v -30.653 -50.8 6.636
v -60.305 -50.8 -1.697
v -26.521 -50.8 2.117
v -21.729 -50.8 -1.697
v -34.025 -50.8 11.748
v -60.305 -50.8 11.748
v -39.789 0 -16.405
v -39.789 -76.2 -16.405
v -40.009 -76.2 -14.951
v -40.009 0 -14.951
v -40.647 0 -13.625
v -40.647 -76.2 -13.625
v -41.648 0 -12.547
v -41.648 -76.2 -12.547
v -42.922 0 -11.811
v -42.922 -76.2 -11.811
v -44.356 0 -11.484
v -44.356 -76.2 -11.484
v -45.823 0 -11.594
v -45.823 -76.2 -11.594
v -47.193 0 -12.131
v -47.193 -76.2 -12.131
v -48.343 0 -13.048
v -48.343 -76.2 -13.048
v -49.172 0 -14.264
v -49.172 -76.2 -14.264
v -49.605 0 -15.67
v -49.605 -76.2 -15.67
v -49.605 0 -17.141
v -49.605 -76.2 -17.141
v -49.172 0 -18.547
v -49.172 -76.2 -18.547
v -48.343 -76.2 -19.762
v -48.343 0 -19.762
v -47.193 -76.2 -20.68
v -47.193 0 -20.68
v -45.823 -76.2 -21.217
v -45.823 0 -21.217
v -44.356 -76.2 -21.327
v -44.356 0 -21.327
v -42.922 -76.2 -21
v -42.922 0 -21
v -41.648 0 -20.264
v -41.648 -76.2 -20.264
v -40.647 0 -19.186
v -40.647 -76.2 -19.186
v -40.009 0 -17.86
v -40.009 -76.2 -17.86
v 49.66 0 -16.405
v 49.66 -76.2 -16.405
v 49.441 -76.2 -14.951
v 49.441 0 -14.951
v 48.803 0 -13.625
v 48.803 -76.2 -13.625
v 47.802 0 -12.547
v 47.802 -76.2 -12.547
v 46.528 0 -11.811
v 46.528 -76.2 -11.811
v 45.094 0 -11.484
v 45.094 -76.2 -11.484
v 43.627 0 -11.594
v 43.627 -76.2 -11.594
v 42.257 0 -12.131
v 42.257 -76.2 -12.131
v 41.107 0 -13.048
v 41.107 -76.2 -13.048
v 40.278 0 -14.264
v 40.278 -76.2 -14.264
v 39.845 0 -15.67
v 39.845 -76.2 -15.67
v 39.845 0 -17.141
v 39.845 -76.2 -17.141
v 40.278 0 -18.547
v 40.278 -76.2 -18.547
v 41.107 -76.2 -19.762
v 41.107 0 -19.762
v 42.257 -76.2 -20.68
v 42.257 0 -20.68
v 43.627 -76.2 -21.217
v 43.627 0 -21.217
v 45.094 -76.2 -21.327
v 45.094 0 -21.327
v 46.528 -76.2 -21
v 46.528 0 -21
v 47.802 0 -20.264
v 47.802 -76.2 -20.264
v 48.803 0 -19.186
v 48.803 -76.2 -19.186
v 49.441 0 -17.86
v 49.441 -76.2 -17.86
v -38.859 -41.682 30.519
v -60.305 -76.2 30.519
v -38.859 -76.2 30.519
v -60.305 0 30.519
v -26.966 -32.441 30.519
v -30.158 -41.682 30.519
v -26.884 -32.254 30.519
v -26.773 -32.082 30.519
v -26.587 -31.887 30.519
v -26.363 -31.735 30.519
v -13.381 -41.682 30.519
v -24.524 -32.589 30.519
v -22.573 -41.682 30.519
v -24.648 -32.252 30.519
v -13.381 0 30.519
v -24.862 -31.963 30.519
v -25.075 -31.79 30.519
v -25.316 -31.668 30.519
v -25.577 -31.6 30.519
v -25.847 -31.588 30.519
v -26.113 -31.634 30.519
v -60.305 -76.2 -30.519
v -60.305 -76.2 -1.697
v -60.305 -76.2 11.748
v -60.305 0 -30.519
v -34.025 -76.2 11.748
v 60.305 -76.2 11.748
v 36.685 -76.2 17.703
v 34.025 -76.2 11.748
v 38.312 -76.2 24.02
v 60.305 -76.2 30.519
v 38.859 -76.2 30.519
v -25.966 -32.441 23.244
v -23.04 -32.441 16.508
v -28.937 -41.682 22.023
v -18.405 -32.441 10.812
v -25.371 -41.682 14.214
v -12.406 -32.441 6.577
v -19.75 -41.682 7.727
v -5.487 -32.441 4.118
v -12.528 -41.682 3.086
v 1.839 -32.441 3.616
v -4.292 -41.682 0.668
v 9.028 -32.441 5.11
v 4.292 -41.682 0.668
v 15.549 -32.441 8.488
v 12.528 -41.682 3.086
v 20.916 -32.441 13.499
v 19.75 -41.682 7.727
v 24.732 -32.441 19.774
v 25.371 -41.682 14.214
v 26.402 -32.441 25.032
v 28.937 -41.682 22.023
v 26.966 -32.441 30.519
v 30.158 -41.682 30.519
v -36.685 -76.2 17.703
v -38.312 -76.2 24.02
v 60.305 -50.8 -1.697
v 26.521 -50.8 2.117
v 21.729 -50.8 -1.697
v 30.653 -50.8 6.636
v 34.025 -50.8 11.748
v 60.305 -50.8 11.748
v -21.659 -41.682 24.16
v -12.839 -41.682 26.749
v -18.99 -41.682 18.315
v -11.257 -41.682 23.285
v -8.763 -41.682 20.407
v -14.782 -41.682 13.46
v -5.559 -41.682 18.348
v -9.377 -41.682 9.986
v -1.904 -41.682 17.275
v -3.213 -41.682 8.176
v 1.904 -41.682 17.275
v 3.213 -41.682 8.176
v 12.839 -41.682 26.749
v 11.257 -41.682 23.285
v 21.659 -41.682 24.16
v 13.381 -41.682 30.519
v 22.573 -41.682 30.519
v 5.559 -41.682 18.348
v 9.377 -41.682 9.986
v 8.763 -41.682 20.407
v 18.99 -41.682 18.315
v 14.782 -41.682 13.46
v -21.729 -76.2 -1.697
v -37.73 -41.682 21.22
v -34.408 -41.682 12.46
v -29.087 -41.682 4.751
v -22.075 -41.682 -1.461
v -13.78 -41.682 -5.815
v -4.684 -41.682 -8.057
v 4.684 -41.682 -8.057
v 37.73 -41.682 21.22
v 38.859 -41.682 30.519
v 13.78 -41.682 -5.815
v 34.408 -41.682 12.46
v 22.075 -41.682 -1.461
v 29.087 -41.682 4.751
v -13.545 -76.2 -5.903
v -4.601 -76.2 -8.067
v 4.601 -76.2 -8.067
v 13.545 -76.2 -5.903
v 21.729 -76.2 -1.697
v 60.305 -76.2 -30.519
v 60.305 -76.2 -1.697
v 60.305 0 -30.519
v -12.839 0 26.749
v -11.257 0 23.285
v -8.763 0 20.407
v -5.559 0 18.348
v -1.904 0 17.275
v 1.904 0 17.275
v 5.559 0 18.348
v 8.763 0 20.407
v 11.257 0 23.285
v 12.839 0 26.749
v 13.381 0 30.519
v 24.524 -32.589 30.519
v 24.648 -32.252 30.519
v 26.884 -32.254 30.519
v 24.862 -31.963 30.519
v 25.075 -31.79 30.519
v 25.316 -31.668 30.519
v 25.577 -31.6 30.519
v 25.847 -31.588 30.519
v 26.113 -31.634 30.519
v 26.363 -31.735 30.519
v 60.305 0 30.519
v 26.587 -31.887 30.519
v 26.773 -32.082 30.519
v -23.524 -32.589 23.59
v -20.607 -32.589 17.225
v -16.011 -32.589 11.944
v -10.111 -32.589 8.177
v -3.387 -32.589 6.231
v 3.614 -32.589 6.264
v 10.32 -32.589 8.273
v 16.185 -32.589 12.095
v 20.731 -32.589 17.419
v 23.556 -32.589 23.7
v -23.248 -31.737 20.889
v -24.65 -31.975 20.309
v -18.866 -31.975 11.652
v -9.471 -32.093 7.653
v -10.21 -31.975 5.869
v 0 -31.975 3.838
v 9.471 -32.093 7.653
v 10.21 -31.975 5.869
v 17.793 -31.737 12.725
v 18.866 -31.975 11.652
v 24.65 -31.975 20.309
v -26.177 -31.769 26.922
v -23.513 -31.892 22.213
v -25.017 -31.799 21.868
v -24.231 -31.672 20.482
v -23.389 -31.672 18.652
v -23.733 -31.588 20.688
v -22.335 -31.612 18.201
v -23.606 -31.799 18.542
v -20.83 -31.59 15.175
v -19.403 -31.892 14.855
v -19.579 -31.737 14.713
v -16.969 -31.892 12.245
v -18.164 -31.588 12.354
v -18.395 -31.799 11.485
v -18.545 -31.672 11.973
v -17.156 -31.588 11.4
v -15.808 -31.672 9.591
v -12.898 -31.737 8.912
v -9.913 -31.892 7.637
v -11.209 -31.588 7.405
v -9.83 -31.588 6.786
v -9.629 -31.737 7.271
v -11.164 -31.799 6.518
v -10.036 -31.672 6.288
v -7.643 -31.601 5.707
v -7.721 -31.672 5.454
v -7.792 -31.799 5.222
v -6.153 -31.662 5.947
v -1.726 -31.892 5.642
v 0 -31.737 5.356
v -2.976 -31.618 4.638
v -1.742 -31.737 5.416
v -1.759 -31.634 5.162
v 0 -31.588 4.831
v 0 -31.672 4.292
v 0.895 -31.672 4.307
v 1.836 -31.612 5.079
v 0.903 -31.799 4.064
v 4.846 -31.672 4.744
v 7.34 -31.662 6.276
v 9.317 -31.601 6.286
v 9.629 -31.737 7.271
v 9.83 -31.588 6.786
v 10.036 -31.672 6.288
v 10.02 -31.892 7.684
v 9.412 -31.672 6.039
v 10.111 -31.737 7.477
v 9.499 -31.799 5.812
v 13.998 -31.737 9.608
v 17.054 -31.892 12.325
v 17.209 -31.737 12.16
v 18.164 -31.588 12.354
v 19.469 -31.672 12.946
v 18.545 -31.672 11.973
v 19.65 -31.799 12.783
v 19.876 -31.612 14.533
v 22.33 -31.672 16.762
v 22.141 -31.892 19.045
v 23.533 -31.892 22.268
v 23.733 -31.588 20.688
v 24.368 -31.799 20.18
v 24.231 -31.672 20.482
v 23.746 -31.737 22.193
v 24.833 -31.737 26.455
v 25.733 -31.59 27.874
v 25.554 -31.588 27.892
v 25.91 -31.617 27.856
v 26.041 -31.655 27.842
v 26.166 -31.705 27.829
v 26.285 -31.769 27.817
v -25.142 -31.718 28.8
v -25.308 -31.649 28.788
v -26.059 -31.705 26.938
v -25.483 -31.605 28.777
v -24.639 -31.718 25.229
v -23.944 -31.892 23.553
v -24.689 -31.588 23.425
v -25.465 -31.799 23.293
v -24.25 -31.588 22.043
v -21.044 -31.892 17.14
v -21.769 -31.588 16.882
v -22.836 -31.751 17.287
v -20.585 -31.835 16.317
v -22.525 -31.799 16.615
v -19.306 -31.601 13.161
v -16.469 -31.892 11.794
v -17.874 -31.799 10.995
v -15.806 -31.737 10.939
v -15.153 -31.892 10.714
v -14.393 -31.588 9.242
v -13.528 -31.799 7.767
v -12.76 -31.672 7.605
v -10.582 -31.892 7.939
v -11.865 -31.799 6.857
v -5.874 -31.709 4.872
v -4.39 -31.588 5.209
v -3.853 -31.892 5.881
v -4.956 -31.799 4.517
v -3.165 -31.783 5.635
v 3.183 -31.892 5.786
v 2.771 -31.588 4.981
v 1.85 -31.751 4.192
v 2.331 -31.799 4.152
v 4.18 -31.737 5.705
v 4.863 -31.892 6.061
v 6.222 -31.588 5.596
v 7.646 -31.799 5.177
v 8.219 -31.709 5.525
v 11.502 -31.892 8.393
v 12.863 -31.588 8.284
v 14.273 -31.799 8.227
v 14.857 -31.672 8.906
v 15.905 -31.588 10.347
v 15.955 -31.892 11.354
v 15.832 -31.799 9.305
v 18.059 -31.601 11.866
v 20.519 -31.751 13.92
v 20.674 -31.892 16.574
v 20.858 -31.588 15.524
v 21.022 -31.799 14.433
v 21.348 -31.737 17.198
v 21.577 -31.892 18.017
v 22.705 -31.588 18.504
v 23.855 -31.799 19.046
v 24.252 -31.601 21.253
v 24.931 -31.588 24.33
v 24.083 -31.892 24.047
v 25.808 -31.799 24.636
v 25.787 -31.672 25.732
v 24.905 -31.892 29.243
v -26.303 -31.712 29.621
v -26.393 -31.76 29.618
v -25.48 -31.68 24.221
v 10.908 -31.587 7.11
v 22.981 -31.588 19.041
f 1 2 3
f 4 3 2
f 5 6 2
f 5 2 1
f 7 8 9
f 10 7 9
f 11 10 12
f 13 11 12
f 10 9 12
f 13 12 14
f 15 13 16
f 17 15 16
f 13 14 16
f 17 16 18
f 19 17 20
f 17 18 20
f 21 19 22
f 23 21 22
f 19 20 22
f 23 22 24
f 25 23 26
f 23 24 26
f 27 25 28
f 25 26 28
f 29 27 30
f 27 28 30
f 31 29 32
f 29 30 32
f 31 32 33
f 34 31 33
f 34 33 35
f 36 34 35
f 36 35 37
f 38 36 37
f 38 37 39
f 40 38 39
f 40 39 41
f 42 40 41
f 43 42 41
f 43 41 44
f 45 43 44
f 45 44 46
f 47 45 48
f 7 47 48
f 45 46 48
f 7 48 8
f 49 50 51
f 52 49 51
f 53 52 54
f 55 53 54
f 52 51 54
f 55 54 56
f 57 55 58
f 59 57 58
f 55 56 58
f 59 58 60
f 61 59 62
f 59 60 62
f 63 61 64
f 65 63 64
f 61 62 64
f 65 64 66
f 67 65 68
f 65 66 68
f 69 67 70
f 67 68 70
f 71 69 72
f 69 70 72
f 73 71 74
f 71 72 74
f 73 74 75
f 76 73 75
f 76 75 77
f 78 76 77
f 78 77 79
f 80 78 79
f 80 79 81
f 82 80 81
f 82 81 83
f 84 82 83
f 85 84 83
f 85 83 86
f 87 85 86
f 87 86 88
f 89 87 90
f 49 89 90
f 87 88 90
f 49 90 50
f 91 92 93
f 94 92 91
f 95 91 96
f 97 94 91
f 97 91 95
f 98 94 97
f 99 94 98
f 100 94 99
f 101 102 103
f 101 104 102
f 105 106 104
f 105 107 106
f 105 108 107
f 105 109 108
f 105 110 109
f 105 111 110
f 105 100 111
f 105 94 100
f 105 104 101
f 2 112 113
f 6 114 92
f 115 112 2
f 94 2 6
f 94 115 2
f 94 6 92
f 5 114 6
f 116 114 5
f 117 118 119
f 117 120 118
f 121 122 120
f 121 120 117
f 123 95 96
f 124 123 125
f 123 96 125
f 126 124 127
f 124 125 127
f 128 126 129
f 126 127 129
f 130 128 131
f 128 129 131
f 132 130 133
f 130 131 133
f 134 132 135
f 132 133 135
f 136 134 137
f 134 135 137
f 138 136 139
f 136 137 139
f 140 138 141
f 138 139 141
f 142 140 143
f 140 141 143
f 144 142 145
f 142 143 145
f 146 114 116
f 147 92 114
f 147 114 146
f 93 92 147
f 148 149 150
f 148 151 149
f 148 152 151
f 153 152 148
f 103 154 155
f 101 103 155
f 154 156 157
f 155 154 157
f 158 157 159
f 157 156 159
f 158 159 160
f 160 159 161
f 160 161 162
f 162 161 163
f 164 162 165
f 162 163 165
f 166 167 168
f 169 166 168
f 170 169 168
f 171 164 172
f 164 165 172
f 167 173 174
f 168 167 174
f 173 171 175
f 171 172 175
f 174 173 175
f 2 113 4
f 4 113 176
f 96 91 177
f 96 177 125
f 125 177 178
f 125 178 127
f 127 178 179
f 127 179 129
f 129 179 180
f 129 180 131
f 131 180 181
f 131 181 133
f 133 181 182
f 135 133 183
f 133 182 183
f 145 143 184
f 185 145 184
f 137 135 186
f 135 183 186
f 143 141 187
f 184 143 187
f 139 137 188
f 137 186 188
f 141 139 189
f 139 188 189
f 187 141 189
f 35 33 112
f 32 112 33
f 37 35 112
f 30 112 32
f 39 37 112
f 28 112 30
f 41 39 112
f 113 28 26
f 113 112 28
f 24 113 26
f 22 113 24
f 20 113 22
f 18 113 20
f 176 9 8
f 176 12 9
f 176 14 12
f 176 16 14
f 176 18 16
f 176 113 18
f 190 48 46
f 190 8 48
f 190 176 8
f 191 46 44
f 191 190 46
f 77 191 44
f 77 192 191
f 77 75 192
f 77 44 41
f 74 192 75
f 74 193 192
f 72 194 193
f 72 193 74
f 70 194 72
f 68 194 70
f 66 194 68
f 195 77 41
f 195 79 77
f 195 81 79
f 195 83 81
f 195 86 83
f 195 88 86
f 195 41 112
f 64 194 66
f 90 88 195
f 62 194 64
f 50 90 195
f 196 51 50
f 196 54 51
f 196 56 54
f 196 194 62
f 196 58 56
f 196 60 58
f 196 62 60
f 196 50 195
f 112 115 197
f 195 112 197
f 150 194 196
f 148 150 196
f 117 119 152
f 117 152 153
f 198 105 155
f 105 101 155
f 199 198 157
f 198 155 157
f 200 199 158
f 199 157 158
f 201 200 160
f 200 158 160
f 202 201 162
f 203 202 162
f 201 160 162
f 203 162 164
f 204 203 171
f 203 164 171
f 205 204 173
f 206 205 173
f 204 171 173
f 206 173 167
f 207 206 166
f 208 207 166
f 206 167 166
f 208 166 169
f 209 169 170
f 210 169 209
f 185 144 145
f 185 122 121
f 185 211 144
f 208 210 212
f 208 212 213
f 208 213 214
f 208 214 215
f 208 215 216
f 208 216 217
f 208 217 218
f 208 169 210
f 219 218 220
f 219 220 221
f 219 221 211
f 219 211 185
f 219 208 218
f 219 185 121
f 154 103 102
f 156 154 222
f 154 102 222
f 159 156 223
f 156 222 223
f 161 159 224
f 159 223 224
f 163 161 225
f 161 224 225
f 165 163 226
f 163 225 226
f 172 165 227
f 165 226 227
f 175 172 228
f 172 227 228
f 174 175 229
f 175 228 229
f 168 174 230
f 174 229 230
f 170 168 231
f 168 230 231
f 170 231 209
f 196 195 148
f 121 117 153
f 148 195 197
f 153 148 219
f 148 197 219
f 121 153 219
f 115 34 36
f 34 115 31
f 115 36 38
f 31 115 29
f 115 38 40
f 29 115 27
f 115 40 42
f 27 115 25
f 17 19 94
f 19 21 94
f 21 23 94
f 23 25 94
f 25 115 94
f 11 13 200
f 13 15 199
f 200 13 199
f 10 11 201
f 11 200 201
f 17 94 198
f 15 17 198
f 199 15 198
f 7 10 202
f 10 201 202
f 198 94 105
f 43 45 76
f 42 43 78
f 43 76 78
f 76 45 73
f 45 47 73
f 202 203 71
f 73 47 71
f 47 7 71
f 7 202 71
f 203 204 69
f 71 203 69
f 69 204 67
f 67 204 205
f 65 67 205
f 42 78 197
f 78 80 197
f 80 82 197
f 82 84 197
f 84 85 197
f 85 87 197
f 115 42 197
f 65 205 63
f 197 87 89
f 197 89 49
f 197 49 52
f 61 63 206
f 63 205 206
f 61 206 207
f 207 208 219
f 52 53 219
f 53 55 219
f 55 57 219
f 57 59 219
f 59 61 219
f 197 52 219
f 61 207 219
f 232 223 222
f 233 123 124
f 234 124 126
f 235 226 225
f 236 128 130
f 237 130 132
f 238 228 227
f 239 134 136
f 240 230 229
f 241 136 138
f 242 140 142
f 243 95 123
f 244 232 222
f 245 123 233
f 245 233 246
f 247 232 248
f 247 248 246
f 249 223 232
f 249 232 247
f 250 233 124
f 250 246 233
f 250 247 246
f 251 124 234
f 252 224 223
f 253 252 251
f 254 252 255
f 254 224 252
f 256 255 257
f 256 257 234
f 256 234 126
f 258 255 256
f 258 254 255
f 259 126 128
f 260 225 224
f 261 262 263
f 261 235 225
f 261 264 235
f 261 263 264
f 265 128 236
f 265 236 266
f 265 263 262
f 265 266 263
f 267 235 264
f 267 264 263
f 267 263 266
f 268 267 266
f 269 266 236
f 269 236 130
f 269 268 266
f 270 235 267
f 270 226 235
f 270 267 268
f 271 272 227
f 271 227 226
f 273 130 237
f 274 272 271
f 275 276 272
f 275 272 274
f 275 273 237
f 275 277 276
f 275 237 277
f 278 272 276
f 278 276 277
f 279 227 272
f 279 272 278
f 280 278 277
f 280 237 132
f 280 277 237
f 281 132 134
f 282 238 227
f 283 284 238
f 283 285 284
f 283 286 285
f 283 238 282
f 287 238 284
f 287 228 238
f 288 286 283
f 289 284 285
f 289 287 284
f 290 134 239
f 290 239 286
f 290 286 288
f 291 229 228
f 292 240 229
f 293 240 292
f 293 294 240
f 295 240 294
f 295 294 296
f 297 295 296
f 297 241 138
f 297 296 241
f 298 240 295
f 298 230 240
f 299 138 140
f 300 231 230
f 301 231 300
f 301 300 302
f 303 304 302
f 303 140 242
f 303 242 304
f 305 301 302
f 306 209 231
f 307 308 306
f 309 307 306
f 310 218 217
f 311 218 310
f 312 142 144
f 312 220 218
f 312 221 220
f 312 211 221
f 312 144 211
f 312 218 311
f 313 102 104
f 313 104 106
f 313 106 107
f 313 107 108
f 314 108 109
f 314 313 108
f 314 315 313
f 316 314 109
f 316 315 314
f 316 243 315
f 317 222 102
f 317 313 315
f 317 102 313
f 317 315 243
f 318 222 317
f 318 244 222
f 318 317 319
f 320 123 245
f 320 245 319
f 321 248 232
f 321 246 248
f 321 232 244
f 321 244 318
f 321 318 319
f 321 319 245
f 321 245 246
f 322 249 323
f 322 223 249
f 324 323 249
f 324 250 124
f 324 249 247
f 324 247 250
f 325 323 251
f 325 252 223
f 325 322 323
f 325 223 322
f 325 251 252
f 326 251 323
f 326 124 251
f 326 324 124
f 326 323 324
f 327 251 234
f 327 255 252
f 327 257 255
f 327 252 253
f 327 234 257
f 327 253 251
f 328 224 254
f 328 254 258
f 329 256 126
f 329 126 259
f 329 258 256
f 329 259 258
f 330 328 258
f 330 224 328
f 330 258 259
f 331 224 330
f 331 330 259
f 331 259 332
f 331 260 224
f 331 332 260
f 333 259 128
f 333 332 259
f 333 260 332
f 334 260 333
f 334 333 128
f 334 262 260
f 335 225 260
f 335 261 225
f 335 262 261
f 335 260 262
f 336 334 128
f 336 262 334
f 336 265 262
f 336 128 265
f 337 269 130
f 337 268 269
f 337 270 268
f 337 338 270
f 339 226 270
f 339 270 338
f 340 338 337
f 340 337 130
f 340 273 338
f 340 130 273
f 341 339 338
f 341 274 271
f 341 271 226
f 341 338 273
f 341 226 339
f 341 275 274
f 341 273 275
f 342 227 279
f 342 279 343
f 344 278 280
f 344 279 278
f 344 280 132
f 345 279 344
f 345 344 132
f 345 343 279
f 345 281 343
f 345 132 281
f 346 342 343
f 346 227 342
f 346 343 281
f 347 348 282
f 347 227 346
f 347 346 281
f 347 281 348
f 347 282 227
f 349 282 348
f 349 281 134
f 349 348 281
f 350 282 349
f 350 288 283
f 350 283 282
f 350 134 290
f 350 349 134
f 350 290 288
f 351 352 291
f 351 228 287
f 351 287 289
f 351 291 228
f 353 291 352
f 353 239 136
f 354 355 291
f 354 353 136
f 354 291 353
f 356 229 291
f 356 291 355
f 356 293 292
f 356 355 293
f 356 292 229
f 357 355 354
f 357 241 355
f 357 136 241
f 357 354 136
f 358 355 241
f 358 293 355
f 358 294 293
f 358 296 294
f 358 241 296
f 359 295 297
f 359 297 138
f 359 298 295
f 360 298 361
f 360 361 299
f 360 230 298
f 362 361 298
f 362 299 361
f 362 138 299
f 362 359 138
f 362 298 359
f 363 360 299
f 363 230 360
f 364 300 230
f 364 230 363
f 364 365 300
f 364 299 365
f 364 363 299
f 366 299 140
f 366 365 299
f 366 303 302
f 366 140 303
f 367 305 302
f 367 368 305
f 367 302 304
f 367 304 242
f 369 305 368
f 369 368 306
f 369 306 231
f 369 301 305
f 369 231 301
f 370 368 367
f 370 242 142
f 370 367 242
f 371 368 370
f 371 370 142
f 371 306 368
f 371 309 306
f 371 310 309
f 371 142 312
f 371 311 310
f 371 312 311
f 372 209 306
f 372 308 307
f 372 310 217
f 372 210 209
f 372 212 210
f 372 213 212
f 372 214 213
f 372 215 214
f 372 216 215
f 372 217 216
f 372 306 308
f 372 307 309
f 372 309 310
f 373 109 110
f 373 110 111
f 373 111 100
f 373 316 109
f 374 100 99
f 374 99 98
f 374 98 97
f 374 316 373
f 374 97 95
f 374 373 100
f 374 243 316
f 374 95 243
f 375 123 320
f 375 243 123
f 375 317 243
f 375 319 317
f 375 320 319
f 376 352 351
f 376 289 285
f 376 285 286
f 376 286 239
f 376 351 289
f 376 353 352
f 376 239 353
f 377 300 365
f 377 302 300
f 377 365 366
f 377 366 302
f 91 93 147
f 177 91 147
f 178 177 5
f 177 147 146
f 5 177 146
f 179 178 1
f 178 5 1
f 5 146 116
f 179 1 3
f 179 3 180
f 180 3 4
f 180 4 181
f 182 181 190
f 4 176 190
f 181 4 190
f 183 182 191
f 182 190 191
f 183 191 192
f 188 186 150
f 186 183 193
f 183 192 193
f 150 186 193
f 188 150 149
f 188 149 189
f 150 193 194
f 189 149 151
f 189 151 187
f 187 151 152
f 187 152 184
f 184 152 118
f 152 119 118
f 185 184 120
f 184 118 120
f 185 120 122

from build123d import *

# Parameters (mm, degrees)
F0_W     = 120.6107288599
F0_H     = 61.03855744
F1_DEPTH = 76.2
F3_ANGLE = 180
F4_W     = 120.6107288599
F4_H     = 13.4453041246
F5_DEPTH = 25.4
F6_R     = 1.27
F7_R     = 4.935476451
F8_DEPTH = 76.2


with BuildPart() as f1:
    # F0 (on Front) → F1 (new body)
    with BuildSketch(Plane.XZ):
        Rectangle(F0_W, F0_H)
    extrude(amount=F1_DEPTH)

    # F2 (on face) → F3 (revolve, cut)
    with BuildSketch(Plane.XY.offset(30.51927872)):
        Polygon((0, -76.2), (0, 0), (-13.3808227256, 0), (-13.3808227256, -41.6820123792), (-22.573298703, -41.6820123792), (-25.4785586149, -28.1363911927), (-30.1583929265, -41.6820123792), (-38.8593822718, -41.6820123792), (-38.8593822718, -76.2), align=None)
    revolve(axis=Axis((0, -30.7025797665, 30.51927872), (0, -1, 0)), revolution_arc=F3_ANGLE, mode=Mode.SUBTRACT)

    # F4 (on face) → F5 (cut)
    with BuildSketch(Plane.XZ.offset(76.2)):
        with Locations((0, 5.0255007227)):
            Rectangle(F4_W, F4_H)
    extrude(amount=-F5_DEPTH, mode=Mode.SUBTRACT)

    # F6
    f6_edges = [f1.edges().sort_by_distance(p)[0] for p in [
        (0, -28.136391, 5.04072),
    ]]
    fillet(f6_edges, radius=F6_R)

    # F7 (on face) → F8 (cut)
    with BuildSketch(Plane.XZ.offset(76.2)):
        with Locations((-44.7249487042, -16.4052583277)):
            Circle(F7_R)
        with Locations((44.7249487042, -16.4052583277)):
            Circle(F7_R)
    extrude(amount=-F8_DEPTH, mode=Mode.SUBTRACT)


solid = f1.part
